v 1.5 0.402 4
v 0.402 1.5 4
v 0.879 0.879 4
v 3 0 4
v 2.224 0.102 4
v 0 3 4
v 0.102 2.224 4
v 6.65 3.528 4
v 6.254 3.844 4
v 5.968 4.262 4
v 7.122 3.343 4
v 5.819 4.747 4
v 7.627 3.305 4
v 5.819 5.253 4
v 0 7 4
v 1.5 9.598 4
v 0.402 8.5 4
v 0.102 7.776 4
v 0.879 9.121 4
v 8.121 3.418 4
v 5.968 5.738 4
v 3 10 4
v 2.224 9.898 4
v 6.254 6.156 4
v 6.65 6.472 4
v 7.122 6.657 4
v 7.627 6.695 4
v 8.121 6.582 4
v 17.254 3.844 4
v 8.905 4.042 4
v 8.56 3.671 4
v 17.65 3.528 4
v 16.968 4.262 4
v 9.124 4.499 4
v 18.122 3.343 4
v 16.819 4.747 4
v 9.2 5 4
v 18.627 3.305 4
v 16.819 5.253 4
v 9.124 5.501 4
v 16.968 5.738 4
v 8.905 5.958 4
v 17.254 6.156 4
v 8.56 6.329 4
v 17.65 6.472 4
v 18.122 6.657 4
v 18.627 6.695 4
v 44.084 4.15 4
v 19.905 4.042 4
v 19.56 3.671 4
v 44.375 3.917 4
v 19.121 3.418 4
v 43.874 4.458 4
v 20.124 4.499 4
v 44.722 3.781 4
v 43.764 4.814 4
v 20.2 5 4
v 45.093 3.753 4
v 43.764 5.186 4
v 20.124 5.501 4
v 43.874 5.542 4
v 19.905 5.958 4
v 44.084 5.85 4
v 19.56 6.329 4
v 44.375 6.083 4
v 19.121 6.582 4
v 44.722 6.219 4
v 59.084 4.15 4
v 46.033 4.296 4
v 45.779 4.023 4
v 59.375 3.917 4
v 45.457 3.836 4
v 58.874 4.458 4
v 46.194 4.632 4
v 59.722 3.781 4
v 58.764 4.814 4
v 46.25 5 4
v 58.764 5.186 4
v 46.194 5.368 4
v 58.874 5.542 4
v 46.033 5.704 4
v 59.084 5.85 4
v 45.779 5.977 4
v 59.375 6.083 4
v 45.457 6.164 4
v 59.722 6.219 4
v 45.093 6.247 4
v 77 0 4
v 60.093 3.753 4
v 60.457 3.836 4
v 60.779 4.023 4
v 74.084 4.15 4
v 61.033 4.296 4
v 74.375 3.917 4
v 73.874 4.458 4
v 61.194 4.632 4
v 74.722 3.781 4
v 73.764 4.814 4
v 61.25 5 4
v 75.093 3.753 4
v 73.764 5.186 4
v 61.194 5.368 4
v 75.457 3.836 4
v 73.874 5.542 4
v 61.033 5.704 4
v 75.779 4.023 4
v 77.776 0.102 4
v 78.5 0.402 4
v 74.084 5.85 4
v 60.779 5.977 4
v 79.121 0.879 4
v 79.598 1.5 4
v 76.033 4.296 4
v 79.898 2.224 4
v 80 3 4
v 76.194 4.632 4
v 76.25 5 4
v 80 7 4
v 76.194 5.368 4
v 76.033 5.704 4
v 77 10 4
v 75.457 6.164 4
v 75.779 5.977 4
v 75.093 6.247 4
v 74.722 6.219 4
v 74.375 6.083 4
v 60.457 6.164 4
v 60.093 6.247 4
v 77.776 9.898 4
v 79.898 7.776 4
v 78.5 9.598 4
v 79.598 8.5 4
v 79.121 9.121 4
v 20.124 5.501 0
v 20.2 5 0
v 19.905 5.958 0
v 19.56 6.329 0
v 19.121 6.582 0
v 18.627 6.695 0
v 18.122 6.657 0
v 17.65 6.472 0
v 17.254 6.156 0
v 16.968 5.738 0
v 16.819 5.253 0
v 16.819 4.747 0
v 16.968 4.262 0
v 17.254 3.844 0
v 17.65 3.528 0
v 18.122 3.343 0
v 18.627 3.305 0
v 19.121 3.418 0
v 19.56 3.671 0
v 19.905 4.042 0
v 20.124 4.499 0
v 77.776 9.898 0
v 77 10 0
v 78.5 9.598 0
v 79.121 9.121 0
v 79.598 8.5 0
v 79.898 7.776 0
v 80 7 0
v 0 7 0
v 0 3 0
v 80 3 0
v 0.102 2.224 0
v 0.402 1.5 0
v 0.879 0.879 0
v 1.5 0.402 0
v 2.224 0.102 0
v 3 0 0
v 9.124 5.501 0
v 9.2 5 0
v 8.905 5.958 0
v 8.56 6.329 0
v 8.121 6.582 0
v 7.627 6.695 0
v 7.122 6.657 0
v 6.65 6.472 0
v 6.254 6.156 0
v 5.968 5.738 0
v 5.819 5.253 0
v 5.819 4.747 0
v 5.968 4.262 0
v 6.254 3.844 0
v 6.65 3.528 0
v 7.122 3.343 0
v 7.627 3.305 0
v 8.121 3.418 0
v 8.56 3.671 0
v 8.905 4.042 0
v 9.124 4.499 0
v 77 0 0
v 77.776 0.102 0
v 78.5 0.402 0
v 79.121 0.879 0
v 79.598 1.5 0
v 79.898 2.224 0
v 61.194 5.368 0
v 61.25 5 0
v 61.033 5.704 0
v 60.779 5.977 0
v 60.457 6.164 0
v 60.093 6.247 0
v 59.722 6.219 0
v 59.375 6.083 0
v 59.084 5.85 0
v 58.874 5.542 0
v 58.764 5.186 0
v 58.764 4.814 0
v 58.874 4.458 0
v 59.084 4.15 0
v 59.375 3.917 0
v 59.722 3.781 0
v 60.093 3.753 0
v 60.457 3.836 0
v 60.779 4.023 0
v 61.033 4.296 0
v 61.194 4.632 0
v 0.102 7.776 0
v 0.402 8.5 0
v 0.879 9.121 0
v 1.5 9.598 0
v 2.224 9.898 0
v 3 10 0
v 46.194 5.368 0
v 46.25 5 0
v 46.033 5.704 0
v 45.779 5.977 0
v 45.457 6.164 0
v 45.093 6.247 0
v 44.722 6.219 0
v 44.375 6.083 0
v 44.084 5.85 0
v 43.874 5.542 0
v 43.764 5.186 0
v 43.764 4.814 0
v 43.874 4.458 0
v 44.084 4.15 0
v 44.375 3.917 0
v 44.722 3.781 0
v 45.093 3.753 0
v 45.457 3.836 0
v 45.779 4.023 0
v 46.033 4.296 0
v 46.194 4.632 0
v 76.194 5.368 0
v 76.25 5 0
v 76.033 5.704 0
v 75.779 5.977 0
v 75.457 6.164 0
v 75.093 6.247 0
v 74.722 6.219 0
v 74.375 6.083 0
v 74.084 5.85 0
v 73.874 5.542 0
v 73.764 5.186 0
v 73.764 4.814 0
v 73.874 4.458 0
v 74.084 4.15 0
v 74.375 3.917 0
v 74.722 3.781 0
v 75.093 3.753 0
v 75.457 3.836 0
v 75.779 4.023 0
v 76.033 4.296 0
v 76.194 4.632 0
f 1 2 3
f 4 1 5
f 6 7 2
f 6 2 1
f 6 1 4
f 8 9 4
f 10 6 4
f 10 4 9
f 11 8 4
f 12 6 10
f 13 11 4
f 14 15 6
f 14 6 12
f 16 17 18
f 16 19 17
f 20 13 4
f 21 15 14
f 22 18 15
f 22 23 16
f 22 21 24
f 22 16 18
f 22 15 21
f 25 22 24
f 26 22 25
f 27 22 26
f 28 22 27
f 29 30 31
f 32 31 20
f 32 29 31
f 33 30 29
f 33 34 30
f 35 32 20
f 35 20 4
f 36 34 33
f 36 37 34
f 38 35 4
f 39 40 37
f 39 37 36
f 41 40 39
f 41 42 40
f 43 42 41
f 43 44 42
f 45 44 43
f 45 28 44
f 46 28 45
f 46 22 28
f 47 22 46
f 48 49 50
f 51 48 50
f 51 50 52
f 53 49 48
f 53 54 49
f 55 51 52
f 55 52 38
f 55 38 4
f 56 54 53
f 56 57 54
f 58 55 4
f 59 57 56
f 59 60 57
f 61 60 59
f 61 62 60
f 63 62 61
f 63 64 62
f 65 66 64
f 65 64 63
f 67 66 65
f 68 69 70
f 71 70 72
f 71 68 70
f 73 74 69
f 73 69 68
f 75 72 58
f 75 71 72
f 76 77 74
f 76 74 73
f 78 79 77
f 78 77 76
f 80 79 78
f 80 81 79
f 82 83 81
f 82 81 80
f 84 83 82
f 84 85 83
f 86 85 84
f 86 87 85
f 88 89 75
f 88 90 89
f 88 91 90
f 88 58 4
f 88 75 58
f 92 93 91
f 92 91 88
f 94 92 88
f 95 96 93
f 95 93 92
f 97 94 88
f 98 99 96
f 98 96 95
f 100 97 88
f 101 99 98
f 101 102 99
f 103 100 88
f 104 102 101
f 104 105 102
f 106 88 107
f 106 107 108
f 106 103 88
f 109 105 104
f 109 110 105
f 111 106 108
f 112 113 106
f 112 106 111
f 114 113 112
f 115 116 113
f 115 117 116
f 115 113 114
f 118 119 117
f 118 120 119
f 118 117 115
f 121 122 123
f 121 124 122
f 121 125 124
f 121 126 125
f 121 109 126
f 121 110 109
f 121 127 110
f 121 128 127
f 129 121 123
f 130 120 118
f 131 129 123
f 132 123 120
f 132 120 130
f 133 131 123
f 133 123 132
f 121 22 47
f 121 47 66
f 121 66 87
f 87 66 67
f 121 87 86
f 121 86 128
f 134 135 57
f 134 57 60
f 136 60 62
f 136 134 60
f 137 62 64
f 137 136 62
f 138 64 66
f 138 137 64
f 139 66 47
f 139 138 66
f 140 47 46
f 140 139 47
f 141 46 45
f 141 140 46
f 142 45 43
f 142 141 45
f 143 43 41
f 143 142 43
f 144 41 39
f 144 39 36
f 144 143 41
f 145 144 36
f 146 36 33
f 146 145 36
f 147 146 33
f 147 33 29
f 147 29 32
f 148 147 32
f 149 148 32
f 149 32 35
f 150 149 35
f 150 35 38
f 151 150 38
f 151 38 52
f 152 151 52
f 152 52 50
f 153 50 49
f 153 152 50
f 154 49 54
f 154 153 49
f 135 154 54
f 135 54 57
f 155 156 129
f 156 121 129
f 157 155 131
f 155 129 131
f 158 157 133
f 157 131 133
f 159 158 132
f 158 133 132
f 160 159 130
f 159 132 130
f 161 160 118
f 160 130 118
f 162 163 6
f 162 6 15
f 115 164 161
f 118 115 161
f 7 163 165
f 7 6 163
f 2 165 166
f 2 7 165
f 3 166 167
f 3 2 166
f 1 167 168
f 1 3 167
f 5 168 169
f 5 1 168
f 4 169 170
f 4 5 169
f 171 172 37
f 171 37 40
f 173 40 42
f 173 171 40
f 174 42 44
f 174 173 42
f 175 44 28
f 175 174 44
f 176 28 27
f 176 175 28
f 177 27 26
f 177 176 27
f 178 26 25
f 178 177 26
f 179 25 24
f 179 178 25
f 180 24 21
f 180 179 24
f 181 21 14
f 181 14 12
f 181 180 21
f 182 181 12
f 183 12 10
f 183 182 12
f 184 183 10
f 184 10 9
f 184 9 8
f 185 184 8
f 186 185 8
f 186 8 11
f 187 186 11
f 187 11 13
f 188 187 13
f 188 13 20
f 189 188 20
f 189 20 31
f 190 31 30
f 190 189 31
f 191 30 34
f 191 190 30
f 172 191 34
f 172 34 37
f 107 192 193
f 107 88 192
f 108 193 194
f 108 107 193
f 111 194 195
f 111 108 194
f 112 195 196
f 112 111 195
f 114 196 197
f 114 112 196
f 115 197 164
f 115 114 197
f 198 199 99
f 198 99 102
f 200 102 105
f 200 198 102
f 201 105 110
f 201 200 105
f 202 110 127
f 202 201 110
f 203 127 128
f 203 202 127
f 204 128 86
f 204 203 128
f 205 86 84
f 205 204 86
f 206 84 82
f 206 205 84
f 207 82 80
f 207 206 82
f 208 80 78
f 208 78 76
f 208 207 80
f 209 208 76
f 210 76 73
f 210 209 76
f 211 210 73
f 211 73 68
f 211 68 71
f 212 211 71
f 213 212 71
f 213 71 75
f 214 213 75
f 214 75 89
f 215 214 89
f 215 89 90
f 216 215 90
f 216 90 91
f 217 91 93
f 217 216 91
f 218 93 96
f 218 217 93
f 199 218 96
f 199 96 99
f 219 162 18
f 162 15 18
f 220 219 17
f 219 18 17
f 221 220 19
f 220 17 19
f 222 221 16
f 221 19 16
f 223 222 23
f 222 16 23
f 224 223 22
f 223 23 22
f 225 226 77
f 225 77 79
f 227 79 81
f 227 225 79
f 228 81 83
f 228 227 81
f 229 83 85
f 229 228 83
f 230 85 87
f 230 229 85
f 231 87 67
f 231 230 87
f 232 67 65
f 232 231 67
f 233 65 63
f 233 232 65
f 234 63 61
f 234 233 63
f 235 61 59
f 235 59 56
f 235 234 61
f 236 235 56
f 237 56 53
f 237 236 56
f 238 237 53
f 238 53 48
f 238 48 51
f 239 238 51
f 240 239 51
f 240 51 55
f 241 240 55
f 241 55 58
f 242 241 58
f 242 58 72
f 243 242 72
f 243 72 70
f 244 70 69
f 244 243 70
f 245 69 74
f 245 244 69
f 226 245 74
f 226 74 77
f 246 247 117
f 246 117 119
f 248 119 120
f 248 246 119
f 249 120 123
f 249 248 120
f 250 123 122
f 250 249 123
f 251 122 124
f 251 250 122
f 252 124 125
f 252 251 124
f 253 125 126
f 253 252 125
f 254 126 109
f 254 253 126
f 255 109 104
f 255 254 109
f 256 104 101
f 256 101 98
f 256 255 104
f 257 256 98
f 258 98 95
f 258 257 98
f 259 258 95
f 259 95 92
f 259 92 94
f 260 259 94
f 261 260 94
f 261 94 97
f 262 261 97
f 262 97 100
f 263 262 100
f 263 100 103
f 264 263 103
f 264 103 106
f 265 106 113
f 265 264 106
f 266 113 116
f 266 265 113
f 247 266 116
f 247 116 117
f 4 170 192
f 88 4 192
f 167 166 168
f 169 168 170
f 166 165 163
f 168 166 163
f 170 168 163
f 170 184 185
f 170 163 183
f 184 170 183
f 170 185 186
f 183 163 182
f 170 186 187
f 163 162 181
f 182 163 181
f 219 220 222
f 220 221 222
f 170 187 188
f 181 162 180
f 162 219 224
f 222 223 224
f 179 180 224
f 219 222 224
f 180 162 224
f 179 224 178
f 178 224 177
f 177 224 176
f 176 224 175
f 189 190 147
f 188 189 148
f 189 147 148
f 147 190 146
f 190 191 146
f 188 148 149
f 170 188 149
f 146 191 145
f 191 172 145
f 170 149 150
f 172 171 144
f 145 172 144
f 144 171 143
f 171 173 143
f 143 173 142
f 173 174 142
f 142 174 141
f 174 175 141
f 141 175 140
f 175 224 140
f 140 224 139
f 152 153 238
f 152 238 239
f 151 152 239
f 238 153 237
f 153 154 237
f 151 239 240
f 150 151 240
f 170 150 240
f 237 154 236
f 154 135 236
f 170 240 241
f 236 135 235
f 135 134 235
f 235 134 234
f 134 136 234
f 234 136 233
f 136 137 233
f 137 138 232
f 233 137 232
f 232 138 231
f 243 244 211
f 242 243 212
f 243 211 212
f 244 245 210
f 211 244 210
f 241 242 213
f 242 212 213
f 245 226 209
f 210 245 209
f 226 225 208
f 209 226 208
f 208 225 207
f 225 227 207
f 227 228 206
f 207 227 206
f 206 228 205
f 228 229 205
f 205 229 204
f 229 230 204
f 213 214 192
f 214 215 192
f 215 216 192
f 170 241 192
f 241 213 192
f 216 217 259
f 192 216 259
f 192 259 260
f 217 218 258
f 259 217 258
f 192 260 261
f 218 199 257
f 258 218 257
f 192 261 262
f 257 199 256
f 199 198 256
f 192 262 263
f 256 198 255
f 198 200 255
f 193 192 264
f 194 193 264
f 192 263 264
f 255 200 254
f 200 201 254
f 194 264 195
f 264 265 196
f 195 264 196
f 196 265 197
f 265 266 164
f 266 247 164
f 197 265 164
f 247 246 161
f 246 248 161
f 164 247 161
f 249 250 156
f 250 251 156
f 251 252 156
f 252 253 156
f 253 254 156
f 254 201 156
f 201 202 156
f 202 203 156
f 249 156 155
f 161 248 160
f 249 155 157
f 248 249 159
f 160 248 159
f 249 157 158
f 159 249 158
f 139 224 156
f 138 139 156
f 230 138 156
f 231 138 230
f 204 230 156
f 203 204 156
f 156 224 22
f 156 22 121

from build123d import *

# Parameters (mm, degrees)
SKETCH_1_W      = 80
SKETCH_1_H      = 10
SKETCH_1_R      = 1.25
SKETCH_1_R_2    = 1.7
EXTRUDE_1_DEPTH = 4
FILLET_1_R      = 3


with BuildPart() as part:
    # 草图1 → 凸台-拉伸1 (new body)
    with BuildSketch(Plane.XY):
        with Locations((40, 5)):
            Rectangle(SKETCH_1_W, SKETCH_1_H)
        with Locations((45, 5)):
            Circle(SKETCH_1_R, mode=Mode.SUBTRACT)
        with Locations((60, 5)):
            Circle(SKETCH_1_R, mode=Mode.SUBTRACT)
        with Locations((75, 5)):
            Circle(SKETCH_1_R, mode=Mode.SUBTRACT)
        with Locations((7.5, 5)):
            Circle(SKETCH_1_R_2, mode=Mode.SUBTRACT)
        with Locations((18.5, 5)):
            Circle(SKETCH_1_R_2, mode=Mode.SUBTRACT)
    extrude(amount=EXTRUDE_1_DEPTH)

    # 圆角1
    fillet_1_edges = [part.edges().sort_by_distance(p)[0] for p in [
        (0, 10, 2),
        (80, 10, 2),
        (80, 0, 2),
        (0, 0, 2),
    ]]
    fillet(fillet_1_edges, radius=FILLET_1_R)


solid = part.part
